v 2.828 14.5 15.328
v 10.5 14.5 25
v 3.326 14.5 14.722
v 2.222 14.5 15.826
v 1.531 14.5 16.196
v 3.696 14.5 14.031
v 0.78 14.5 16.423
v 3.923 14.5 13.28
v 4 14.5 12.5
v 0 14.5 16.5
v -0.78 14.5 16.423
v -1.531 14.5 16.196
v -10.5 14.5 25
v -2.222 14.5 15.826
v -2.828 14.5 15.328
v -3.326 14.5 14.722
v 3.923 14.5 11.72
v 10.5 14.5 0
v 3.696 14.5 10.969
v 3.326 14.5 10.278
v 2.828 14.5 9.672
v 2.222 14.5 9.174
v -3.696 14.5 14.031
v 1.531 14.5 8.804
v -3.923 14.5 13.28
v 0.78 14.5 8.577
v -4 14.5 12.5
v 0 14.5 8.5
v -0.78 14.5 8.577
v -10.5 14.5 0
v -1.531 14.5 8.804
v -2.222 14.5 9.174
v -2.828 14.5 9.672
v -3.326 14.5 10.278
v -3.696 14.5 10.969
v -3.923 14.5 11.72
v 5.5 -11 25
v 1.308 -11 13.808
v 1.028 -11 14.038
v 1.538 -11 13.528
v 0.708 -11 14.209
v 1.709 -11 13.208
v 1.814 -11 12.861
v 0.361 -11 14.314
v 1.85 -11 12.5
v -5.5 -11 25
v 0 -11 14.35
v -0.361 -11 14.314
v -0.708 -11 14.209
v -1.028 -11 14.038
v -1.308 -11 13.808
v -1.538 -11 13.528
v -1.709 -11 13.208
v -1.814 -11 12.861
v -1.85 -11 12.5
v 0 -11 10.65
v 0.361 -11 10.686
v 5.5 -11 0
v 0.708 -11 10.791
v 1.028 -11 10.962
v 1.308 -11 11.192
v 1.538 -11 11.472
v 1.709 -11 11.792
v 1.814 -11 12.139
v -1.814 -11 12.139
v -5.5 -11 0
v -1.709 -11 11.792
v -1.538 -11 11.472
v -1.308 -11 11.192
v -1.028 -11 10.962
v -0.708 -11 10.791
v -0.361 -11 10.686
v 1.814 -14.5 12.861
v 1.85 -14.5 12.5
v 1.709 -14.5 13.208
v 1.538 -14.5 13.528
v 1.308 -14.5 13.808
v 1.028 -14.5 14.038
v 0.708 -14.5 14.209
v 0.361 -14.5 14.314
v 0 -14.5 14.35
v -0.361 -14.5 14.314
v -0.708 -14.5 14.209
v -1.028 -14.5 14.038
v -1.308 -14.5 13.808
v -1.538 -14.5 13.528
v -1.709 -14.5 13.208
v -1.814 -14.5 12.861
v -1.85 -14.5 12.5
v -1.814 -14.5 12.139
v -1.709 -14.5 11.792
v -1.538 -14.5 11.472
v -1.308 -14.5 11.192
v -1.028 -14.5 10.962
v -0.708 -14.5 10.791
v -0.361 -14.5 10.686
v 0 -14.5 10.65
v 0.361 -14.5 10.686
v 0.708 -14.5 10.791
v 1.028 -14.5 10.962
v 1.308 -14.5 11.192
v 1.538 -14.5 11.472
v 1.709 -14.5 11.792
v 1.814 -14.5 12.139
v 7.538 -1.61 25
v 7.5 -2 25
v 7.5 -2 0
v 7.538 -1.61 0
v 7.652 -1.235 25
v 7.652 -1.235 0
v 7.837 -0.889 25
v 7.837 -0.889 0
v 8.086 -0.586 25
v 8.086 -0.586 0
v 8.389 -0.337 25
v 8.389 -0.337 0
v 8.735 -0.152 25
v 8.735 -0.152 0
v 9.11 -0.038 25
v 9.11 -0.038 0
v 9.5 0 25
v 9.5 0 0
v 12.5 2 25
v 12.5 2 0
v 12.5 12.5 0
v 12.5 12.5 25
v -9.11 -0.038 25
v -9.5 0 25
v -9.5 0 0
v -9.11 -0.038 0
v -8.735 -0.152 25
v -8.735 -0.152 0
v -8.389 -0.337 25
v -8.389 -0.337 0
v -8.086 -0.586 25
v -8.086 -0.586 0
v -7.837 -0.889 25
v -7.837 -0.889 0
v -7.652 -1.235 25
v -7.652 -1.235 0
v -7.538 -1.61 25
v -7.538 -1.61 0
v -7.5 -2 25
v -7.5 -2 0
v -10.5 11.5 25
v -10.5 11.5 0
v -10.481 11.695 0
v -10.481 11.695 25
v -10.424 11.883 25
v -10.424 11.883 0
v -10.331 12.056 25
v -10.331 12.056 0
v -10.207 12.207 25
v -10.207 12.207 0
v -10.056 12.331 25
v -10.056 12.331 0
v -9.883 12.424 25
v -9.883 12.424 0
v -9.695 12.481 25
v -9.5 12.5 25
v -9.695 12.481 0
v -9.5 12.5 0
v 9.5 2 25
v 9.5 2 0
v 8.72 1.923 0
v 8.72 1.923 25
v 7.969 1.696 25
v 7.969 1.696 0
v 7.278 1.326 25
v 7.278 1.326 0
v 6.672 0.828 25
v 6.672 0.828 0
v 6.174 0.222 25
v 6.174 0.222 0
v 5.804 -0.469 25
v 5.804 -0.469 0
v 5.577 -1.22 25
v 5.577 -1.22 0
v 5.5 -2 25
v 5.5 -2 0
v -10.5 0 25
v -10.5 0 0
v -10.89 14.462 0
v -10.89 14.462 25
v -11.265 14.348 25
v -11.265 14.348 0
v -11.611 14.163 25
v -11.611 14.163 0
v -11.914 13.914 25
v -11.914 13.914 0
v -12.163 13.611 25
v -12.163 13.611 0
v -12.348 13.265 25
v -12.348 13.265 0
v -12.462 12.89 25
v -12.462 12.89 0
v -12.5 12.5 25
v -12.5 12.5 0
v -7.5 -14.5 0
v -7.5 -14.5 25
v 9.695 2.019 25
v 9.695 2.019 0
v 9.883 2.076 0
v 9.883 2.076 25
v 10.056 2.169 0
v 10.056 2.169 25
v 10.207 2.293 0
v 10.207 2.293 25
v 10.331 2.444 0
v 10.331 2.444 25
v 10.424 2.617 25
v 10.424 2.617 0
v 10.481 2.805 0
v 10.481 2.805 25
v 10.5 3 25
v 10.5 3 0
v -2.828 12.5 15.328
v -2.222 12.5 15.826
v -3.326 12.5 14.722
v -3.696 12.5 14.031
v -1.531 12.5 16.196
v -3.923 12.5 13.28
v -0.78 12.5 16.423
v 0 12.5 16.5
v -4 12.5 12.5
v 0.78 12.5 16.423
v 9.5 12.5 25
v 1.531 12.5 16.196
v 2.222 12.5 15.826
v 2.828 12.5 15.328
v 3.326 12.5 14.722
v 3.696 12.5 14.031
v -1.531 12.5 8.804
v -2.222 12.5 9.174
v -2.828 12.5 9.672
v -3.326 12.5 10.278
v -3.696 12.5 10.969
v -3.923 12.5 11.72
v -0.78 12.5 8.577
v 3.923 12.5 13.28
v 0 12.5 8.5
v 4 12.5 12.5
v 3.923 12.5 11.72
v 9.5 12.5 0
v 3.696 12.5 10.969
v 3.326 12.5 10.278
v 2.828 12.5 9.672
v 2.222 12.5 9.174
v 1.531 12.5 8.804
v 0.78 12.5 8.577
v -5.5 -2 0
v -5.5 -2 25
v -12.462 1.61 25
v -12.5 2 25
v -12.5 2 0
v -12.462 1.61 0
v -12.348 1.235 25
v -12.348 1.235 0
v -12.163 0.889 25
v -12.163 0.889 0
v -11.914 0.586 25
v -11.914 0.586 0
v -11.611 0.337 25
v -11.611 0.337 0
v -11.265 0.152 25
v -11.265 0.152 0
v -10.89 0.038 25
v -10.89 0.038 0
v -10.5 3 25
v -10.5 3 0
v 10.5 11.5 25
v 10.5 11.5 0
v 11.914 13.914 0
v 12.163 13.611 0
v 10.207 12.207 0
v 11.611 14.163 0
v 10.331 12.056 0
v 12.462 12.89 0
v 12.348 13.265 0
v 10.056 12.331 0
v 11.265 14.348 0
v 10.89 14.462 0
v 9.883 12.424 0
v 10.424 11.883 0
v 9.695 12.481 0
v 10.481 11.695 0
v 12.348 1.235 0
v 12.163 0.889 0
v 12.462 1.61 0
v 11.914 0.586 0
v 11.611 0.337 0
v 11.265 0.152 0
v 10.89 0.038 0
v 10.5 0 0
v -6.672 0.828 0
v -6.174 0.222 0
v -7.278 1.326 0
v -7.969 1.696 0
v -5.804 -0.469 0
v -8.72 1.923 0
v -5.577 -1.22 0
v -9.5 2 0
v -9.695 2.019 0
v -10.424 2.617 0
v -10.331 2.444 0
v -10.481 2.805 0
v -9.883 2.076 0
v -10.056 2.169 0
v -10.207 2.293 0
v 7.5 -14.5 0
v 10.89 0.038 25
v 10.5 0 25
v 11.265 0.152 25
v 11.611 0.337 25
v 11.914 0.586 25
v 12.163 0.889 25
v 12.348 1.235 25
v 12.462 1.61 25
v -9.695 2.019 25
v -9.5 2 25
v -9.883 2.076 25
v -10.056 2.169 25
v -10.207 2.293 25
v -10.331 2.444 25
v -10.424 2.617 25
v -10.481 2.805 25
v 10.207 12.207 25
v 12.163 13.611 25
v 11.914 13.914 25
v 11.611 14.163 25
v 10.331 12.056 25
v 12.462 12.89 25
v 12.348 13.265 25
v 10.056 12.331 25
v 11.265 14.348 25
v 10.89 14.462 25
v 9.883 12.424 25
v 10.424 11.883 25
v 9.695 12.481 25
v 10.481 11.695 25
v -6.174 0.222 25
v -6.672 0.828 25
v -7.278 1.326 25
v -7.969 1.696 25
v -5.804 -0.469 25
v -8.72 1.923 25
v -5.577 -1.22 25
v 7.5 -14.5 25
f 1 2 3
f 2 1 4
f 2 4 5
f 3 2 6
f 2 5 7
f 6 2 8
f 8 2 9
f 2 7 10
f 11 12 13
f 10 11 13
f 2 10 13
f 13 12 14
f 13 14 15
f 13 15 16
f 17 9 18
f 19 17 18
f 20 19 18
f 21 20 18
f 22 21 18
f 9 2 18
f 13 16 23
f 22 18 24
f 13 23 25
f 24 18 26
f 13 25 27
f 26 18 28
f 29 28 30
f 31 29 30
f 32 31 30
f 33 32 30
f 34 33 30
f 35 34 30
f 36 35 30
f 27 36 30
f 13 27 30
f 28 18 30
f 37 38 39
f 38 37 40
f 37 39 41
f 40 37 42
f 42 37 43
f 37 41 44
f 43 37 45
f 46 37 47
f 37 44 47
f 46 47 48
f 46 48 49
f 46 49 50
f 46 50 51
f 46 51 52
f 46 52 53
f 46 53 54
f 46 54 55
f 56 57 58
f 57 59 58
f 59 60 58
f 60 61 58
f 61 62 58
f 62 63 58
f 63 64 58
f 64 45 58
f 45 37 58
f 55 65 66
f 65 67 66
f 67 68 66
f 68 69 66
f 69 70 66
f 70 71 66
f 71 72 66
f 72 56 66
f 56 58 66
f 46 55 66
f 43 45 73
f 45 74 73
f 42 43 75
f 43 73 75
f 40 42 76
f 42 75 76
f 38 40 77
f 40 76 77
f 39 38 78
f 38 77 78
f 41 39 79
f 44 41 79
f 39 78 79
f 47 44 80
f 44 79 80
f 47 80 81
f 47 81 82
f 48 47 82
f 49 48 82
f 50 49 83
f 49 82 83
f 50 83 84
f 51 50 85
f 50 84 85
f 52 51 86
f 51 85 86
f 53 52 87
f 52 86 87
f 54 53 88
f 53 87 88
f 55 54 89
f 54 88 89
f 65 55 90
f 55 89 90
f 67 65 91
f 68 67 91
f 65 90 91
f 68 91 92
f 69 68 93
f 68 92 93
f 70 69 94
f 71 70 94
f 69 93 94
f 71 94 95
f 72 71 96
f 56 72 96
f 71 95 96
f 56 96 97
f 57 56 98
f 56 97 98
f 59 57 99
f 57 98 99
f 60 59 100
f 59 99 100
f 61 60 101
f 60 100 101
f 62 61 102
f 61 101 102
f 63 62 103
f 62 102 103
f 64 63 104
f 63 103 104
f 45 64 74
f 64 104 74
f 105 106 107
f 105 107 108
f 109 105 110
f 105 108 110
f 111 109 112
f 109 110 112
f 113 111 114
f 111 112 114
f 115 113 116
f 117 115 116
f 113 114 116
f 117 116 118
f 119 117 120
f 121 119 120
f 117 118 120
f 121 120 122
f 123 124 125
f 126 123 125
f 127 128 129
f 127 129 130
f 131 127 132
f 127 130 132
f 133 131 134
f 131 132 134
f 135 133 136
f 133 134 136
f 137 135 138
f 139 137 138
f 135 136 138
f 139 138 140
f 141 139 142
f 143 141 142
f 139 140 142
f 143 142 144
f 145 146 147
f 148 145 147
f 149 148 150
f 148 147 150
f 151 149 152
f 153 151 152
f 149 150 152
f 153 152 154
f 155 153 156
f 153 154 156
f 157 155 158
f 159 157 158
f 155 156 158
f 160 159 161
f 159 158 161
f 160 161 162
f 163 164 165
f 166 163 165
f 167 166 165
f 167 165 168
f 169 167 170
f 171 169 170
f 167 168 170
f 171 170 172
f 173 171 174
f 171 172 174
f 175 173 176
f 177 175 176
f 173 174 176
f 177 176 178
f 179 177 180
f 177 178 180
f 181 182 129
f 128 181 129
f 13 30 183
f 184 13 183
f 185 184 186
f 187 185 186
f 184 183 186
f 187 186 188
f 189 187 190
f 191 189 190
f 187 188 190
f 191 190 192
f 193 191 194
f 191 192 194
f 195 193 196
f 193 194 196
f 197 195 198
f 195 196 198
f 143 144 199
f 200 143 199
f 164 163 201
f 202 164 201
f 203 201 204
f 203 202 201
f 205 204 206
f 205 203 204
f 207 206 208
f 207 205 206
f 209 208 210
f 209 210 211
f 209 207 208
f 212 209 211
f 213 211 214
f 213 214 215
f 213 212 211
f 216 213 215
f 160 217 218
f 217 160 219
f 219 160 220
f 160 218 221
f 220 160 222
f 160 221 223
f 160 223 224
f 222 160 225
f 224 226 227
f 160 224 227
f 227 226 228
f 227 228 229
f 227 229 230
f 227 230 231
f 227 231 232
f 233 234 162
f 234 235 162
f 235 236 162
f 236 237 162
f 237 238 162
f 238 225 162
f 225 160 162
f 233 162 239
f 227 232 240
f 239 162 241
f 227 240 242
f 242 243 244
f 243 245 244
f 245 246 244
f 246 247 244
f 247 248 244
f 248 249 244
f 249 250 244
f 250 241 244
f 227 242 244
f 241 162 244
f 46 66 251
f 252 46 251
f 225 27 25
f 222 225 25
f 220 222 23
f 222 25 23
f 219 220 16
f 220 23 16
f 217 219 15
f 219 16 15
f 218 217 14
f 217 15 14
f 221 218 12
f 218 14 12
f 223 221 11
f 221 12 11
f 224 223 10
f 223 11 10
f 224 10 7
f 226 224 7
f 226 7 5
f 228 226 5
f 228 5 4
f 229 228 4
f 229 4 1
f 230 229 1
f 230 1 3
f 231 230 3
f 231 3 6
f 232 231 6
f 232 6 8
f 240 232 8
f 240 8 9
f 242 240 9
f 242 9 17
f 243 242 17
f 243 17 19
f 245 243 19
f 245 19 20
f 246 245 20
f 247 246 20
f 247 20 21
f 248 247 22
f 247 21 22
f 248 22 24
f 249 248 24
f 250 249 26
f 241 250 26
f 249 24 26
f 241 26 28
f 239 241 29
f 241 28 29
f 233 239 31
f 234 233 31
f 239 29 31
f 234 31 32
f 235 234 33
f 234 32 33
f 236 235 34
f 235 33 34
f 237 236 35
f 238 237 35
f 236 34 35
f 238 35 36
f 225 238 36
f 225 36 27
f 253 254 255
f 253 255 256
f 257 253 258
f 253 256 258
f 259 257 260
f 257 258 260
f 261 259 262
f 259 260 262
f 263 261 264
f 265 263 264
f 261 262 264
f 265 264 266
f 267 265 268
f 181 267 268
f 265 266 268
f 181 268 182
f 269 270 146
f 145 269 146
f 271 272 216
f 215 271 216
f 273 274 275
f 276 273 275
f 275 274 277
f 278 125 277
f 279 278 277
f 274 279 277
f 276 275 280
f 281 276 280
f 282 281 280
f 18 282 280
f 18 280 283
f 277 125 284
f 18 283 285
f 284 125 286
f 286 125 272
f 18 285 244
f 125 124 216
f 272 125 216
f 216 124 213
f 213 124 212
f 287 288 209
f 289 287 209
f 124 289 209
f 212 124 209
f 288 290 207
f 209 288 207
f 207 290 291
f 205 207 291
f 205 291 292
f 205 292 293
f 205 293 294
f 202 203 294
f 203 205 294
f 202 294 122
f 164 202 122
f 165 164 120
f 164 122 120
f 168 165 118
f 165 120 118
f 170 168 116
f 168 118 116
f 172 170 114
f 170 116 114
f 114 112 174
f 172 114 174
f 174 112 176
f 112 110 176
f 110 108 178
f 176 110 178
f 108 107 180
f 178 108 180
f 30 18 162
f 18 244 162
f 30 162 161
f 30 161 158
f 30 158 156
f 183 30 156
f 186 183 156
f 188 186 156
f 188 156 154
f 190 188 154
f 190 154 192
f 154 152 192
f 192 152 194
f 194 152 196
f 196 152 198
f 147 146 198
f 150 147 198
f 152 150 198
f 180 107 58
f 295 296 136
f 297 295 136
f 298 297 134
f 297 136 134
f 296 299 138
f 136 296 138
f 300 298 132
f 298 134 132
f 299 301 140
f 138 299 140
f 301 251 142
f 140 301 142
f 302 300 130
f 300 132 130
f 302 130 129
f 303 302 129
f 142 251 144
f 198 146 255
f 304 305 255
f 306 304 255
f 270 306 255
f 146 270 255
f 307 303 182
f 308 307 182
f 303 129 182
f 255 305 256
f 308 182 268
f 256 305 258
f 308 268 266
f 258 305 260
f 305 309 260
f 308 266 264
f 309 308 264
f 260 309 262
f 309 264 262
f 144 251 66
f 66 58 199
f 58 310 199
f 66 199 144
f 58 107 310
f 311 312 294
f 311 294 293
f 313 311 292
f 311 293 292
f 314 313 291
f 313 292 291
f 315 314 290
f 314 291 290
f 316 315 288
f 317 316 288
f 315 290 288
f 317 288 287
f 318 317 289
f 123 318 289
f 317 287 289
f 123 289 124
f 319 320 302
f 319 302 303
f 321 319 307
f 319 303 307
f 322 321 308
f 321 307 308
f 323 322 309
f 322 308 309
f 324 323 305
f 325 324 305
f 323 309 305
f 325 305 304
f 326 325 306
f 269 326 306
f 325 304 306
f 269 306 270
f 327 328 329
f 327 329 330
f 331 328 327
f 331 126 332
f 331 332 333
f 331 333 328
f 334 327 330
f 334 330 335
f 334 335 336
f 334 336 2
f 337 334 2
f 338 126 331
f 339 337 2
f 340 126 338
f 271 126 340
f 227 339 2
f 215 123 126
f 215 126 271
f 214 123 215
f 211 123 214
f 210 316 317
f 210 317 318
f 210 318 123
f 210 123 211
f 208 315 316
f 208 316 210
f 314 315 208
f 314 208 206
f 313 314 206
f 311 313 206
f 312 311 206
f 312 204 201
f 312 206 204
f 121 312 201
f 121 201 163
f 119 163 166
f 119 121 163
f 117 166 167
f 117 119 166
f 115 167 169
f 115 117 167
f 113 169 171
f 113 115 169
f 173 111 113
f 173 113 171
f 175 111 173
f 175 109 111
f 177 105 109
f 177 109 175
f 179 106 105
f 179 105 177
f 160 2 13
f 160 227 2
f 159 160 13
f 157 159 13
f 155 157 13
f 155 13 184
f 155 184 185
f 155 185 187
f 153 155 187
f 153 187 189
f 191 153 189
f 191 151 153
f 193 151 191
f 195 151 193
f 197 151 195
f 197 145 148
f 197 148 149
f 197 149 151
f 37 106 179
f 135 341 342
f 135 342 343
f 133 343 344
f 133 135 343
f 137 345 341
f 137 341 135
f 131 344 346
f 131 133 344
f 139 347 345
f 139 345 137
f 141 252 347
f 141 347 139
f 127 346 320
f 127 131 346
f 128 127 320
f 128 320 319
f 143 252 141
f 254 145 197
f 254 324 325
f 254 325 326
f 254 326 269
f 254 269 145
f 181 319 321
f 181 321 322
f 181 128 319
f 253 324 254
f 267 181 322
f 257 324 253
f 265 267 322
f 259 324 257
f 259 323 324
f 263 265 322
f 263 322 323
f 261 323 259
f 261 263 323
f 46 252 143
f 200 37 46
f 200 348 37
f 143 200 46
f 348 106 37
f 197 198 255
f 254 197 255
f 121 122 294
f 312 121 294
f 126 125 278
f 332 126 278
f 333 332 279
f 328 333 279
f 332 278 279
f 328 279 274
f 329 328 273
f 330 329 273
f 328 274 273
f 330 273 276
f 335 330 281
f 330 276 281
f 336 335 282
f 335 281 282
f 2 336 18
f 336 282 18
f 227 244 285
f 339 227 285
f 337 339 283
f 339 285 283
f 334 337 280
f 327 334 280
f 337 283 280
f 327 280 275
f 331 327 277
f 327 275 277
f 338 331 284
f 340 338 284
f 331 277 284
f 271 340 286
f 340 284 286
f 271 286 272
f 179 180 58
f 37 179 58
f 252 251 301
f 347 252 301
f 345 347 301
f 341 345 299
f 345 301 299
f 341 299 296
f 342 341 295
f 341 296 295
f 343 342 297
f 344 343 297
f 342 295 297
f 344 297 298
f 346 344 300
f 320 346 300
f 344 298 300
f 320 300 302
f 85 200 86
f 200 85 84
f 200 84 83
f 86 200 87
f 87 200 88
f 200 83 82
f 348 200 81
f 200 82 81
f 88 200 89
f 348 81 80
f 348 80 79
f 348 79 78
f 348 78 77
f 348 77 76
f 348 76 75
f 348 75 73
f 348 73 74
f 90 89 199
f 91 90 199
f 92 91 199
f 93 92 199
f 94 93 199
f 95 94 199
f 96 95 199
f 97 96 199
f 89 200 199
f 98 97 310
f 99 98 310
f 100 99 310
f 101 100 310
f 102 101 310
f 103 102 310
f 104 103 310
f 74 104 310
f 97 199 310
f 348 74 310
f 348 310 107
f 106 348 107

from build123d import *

# Parameters (mm, degrees)
F1_DEPTH    = 25
F2_R        = 1.85
F3_DEPTH    = 16.3
F4_T1_DEPTH = 25
F7_R        = 4
F5_DEPTH    = 8.1194955856
F6_DEPTH    = 1.5


# Not quite as in the source:
# - a fillet or chamfer that OpenCascade refuses, or shapes differently, is made with other operations: its cross-section is extruded or revolved along the edge and cut away or added


with BuildPart() as f1:
    # F0 (on Top) → F1 (new body)
    with BuildSketch(Plane.XY):
        with BuildLine():
            Line((-7.5, -2), (-7.5, -14.5))
            Line((-7.5, -14.5), (7.5, -14.5))
            Line((7.5, -14.5), (7.5, -2))
            ThreePointArc((7.5, -2), (8.0857864376, -0.5857864376), (9.5, 0))
            Line((9.5, 0), (10.5, 0))
            ThreePointArc((10.5, 0), (11.9142135624, 0.5857864376), (12.5, 2))
            Line((12.5, 2), (12.5, 12.5))
            ThreePointArc((12.5, 12.5), (11.9142135624, 13.9142135624), (10.5, 14.5))
            Line((10.5, 14.5), (-10.5, 14.5))
            ThreePointArc((-10.5, 14.5), (-11.9142135624, 13.9142135624), (-12.5, 12.5))
            Line((-12.5, 12.5), (-12.5, 2))
            ThreePointArc((-12.5, 2), (-11.9142135624, 0.5857864376), (-10.5, 0))
            Line((-10.5, 0), (-9.5, 0))
            ThreePointArc((-9.5, 0), (-8.0857864376, -0.5857864376), (-7.5, -2))
        make_face()
        with BuildLine():
            Line((-10.5, 1.8729833462), (-10.5, 12.5))
            Line((-10.5, 12.5), (10.5, 12.5))
            Line((10.5, 12.5), (10.5, 1.8729833462))
            ThreePointArc((10.5, 1.8729833462), (7.0505102572, 1.1622776602), (5.5, -2))
            Line((5.5, -2), (5.5, -12.5))
            Line((5.5, -12.5), (-5.5, -12.5))
            Line((-5.5, -12.5), (-5.5, -2))
            ThreePointArc((-5.5, -2), (-7.0505102572, 1.1622776602), (-10.5, 1.8729833462))
        make_face(mode=Mode.SUBTRACT)
    extrude(amount=F1_DEPTH)

    # F2 (on face) → F3 (cut)
    with BuildSketch(Plane.XZ.offset(14.5)):
        with Locations((0, 12.5)):
            Circle(F2_R)
    extrude(amount=-F3_DEPTH, mode=Mode.SUBTRACT)

    # F4: fillet of radius 1 on 4 edges, made by hand

    # F4_s2 → F4_t1 (join)
    with BuildSketch(Plane.XY):
        with BuildLine():
            ThreePointArc((-10.5, 11.5), (-10.2071067812, 12.2071067812), (-9.5, 12.5))
            Line((-9.5, 12.5), (-10.5, 12.5))
            Line((-10.5, 12.5), (-10.5, 11.5))
        make_face()
        with BuildLine():
            ThreePointArc((9.5, 12.5), (10.2071067812, 12.2071067812), (10.5, 11.5))
            Line((10.5, 11.5), (10.5, 12.5))
            Line((10.5, 12.5), (9.5, 12.5))
        make_face()
        with BuildLine():
            ThreePointArc((9.5, 2), (10.2071067812, 2.2928932188), (10.5, 3))
            Line((10.5, 3), (10.5, 1.8729833462))
            ThreePointArc((10.5, 1.8729833462), (10.0040171699, 1.9681187851), (9.5, 2))
        make_face()
        with BuildLine():
            ThreePointArc((-9.5, 2), (-10.2071067812, 2.2928932188), (-10.5, 3))
            Line((-10.5, 3), (-10.5, 1.8729833462))
            ThreePointArc((-10.5, 1.8729833462), (-10.0040171699, 1.9681187851), (-9.5, 2))
        make_face()
    extrude(amount=F4_T1_DEPTH)

    # F7 (on face) → F5 (cut)
    with BuildSketch(Plane(origin=(0, 14.5, 0), x_dir=(-1, 0, 0), z_dir=(0, 1, 0))):
        with Locations((0, 12.5)):
            Circle(F7_R)
    extrude(amount=-F5_DEPTH, mode=Mode.SUBTRACT)

    # F6 (add): a face of the model
    f6_faces = [f1.faces().sort_by_distance(p)[0] for p in [
        (5.2268699943, -12.5, 12.5),
    ]]
    extrude(f6_faces, amount=F6_DEPTH)


solid = f1.part
